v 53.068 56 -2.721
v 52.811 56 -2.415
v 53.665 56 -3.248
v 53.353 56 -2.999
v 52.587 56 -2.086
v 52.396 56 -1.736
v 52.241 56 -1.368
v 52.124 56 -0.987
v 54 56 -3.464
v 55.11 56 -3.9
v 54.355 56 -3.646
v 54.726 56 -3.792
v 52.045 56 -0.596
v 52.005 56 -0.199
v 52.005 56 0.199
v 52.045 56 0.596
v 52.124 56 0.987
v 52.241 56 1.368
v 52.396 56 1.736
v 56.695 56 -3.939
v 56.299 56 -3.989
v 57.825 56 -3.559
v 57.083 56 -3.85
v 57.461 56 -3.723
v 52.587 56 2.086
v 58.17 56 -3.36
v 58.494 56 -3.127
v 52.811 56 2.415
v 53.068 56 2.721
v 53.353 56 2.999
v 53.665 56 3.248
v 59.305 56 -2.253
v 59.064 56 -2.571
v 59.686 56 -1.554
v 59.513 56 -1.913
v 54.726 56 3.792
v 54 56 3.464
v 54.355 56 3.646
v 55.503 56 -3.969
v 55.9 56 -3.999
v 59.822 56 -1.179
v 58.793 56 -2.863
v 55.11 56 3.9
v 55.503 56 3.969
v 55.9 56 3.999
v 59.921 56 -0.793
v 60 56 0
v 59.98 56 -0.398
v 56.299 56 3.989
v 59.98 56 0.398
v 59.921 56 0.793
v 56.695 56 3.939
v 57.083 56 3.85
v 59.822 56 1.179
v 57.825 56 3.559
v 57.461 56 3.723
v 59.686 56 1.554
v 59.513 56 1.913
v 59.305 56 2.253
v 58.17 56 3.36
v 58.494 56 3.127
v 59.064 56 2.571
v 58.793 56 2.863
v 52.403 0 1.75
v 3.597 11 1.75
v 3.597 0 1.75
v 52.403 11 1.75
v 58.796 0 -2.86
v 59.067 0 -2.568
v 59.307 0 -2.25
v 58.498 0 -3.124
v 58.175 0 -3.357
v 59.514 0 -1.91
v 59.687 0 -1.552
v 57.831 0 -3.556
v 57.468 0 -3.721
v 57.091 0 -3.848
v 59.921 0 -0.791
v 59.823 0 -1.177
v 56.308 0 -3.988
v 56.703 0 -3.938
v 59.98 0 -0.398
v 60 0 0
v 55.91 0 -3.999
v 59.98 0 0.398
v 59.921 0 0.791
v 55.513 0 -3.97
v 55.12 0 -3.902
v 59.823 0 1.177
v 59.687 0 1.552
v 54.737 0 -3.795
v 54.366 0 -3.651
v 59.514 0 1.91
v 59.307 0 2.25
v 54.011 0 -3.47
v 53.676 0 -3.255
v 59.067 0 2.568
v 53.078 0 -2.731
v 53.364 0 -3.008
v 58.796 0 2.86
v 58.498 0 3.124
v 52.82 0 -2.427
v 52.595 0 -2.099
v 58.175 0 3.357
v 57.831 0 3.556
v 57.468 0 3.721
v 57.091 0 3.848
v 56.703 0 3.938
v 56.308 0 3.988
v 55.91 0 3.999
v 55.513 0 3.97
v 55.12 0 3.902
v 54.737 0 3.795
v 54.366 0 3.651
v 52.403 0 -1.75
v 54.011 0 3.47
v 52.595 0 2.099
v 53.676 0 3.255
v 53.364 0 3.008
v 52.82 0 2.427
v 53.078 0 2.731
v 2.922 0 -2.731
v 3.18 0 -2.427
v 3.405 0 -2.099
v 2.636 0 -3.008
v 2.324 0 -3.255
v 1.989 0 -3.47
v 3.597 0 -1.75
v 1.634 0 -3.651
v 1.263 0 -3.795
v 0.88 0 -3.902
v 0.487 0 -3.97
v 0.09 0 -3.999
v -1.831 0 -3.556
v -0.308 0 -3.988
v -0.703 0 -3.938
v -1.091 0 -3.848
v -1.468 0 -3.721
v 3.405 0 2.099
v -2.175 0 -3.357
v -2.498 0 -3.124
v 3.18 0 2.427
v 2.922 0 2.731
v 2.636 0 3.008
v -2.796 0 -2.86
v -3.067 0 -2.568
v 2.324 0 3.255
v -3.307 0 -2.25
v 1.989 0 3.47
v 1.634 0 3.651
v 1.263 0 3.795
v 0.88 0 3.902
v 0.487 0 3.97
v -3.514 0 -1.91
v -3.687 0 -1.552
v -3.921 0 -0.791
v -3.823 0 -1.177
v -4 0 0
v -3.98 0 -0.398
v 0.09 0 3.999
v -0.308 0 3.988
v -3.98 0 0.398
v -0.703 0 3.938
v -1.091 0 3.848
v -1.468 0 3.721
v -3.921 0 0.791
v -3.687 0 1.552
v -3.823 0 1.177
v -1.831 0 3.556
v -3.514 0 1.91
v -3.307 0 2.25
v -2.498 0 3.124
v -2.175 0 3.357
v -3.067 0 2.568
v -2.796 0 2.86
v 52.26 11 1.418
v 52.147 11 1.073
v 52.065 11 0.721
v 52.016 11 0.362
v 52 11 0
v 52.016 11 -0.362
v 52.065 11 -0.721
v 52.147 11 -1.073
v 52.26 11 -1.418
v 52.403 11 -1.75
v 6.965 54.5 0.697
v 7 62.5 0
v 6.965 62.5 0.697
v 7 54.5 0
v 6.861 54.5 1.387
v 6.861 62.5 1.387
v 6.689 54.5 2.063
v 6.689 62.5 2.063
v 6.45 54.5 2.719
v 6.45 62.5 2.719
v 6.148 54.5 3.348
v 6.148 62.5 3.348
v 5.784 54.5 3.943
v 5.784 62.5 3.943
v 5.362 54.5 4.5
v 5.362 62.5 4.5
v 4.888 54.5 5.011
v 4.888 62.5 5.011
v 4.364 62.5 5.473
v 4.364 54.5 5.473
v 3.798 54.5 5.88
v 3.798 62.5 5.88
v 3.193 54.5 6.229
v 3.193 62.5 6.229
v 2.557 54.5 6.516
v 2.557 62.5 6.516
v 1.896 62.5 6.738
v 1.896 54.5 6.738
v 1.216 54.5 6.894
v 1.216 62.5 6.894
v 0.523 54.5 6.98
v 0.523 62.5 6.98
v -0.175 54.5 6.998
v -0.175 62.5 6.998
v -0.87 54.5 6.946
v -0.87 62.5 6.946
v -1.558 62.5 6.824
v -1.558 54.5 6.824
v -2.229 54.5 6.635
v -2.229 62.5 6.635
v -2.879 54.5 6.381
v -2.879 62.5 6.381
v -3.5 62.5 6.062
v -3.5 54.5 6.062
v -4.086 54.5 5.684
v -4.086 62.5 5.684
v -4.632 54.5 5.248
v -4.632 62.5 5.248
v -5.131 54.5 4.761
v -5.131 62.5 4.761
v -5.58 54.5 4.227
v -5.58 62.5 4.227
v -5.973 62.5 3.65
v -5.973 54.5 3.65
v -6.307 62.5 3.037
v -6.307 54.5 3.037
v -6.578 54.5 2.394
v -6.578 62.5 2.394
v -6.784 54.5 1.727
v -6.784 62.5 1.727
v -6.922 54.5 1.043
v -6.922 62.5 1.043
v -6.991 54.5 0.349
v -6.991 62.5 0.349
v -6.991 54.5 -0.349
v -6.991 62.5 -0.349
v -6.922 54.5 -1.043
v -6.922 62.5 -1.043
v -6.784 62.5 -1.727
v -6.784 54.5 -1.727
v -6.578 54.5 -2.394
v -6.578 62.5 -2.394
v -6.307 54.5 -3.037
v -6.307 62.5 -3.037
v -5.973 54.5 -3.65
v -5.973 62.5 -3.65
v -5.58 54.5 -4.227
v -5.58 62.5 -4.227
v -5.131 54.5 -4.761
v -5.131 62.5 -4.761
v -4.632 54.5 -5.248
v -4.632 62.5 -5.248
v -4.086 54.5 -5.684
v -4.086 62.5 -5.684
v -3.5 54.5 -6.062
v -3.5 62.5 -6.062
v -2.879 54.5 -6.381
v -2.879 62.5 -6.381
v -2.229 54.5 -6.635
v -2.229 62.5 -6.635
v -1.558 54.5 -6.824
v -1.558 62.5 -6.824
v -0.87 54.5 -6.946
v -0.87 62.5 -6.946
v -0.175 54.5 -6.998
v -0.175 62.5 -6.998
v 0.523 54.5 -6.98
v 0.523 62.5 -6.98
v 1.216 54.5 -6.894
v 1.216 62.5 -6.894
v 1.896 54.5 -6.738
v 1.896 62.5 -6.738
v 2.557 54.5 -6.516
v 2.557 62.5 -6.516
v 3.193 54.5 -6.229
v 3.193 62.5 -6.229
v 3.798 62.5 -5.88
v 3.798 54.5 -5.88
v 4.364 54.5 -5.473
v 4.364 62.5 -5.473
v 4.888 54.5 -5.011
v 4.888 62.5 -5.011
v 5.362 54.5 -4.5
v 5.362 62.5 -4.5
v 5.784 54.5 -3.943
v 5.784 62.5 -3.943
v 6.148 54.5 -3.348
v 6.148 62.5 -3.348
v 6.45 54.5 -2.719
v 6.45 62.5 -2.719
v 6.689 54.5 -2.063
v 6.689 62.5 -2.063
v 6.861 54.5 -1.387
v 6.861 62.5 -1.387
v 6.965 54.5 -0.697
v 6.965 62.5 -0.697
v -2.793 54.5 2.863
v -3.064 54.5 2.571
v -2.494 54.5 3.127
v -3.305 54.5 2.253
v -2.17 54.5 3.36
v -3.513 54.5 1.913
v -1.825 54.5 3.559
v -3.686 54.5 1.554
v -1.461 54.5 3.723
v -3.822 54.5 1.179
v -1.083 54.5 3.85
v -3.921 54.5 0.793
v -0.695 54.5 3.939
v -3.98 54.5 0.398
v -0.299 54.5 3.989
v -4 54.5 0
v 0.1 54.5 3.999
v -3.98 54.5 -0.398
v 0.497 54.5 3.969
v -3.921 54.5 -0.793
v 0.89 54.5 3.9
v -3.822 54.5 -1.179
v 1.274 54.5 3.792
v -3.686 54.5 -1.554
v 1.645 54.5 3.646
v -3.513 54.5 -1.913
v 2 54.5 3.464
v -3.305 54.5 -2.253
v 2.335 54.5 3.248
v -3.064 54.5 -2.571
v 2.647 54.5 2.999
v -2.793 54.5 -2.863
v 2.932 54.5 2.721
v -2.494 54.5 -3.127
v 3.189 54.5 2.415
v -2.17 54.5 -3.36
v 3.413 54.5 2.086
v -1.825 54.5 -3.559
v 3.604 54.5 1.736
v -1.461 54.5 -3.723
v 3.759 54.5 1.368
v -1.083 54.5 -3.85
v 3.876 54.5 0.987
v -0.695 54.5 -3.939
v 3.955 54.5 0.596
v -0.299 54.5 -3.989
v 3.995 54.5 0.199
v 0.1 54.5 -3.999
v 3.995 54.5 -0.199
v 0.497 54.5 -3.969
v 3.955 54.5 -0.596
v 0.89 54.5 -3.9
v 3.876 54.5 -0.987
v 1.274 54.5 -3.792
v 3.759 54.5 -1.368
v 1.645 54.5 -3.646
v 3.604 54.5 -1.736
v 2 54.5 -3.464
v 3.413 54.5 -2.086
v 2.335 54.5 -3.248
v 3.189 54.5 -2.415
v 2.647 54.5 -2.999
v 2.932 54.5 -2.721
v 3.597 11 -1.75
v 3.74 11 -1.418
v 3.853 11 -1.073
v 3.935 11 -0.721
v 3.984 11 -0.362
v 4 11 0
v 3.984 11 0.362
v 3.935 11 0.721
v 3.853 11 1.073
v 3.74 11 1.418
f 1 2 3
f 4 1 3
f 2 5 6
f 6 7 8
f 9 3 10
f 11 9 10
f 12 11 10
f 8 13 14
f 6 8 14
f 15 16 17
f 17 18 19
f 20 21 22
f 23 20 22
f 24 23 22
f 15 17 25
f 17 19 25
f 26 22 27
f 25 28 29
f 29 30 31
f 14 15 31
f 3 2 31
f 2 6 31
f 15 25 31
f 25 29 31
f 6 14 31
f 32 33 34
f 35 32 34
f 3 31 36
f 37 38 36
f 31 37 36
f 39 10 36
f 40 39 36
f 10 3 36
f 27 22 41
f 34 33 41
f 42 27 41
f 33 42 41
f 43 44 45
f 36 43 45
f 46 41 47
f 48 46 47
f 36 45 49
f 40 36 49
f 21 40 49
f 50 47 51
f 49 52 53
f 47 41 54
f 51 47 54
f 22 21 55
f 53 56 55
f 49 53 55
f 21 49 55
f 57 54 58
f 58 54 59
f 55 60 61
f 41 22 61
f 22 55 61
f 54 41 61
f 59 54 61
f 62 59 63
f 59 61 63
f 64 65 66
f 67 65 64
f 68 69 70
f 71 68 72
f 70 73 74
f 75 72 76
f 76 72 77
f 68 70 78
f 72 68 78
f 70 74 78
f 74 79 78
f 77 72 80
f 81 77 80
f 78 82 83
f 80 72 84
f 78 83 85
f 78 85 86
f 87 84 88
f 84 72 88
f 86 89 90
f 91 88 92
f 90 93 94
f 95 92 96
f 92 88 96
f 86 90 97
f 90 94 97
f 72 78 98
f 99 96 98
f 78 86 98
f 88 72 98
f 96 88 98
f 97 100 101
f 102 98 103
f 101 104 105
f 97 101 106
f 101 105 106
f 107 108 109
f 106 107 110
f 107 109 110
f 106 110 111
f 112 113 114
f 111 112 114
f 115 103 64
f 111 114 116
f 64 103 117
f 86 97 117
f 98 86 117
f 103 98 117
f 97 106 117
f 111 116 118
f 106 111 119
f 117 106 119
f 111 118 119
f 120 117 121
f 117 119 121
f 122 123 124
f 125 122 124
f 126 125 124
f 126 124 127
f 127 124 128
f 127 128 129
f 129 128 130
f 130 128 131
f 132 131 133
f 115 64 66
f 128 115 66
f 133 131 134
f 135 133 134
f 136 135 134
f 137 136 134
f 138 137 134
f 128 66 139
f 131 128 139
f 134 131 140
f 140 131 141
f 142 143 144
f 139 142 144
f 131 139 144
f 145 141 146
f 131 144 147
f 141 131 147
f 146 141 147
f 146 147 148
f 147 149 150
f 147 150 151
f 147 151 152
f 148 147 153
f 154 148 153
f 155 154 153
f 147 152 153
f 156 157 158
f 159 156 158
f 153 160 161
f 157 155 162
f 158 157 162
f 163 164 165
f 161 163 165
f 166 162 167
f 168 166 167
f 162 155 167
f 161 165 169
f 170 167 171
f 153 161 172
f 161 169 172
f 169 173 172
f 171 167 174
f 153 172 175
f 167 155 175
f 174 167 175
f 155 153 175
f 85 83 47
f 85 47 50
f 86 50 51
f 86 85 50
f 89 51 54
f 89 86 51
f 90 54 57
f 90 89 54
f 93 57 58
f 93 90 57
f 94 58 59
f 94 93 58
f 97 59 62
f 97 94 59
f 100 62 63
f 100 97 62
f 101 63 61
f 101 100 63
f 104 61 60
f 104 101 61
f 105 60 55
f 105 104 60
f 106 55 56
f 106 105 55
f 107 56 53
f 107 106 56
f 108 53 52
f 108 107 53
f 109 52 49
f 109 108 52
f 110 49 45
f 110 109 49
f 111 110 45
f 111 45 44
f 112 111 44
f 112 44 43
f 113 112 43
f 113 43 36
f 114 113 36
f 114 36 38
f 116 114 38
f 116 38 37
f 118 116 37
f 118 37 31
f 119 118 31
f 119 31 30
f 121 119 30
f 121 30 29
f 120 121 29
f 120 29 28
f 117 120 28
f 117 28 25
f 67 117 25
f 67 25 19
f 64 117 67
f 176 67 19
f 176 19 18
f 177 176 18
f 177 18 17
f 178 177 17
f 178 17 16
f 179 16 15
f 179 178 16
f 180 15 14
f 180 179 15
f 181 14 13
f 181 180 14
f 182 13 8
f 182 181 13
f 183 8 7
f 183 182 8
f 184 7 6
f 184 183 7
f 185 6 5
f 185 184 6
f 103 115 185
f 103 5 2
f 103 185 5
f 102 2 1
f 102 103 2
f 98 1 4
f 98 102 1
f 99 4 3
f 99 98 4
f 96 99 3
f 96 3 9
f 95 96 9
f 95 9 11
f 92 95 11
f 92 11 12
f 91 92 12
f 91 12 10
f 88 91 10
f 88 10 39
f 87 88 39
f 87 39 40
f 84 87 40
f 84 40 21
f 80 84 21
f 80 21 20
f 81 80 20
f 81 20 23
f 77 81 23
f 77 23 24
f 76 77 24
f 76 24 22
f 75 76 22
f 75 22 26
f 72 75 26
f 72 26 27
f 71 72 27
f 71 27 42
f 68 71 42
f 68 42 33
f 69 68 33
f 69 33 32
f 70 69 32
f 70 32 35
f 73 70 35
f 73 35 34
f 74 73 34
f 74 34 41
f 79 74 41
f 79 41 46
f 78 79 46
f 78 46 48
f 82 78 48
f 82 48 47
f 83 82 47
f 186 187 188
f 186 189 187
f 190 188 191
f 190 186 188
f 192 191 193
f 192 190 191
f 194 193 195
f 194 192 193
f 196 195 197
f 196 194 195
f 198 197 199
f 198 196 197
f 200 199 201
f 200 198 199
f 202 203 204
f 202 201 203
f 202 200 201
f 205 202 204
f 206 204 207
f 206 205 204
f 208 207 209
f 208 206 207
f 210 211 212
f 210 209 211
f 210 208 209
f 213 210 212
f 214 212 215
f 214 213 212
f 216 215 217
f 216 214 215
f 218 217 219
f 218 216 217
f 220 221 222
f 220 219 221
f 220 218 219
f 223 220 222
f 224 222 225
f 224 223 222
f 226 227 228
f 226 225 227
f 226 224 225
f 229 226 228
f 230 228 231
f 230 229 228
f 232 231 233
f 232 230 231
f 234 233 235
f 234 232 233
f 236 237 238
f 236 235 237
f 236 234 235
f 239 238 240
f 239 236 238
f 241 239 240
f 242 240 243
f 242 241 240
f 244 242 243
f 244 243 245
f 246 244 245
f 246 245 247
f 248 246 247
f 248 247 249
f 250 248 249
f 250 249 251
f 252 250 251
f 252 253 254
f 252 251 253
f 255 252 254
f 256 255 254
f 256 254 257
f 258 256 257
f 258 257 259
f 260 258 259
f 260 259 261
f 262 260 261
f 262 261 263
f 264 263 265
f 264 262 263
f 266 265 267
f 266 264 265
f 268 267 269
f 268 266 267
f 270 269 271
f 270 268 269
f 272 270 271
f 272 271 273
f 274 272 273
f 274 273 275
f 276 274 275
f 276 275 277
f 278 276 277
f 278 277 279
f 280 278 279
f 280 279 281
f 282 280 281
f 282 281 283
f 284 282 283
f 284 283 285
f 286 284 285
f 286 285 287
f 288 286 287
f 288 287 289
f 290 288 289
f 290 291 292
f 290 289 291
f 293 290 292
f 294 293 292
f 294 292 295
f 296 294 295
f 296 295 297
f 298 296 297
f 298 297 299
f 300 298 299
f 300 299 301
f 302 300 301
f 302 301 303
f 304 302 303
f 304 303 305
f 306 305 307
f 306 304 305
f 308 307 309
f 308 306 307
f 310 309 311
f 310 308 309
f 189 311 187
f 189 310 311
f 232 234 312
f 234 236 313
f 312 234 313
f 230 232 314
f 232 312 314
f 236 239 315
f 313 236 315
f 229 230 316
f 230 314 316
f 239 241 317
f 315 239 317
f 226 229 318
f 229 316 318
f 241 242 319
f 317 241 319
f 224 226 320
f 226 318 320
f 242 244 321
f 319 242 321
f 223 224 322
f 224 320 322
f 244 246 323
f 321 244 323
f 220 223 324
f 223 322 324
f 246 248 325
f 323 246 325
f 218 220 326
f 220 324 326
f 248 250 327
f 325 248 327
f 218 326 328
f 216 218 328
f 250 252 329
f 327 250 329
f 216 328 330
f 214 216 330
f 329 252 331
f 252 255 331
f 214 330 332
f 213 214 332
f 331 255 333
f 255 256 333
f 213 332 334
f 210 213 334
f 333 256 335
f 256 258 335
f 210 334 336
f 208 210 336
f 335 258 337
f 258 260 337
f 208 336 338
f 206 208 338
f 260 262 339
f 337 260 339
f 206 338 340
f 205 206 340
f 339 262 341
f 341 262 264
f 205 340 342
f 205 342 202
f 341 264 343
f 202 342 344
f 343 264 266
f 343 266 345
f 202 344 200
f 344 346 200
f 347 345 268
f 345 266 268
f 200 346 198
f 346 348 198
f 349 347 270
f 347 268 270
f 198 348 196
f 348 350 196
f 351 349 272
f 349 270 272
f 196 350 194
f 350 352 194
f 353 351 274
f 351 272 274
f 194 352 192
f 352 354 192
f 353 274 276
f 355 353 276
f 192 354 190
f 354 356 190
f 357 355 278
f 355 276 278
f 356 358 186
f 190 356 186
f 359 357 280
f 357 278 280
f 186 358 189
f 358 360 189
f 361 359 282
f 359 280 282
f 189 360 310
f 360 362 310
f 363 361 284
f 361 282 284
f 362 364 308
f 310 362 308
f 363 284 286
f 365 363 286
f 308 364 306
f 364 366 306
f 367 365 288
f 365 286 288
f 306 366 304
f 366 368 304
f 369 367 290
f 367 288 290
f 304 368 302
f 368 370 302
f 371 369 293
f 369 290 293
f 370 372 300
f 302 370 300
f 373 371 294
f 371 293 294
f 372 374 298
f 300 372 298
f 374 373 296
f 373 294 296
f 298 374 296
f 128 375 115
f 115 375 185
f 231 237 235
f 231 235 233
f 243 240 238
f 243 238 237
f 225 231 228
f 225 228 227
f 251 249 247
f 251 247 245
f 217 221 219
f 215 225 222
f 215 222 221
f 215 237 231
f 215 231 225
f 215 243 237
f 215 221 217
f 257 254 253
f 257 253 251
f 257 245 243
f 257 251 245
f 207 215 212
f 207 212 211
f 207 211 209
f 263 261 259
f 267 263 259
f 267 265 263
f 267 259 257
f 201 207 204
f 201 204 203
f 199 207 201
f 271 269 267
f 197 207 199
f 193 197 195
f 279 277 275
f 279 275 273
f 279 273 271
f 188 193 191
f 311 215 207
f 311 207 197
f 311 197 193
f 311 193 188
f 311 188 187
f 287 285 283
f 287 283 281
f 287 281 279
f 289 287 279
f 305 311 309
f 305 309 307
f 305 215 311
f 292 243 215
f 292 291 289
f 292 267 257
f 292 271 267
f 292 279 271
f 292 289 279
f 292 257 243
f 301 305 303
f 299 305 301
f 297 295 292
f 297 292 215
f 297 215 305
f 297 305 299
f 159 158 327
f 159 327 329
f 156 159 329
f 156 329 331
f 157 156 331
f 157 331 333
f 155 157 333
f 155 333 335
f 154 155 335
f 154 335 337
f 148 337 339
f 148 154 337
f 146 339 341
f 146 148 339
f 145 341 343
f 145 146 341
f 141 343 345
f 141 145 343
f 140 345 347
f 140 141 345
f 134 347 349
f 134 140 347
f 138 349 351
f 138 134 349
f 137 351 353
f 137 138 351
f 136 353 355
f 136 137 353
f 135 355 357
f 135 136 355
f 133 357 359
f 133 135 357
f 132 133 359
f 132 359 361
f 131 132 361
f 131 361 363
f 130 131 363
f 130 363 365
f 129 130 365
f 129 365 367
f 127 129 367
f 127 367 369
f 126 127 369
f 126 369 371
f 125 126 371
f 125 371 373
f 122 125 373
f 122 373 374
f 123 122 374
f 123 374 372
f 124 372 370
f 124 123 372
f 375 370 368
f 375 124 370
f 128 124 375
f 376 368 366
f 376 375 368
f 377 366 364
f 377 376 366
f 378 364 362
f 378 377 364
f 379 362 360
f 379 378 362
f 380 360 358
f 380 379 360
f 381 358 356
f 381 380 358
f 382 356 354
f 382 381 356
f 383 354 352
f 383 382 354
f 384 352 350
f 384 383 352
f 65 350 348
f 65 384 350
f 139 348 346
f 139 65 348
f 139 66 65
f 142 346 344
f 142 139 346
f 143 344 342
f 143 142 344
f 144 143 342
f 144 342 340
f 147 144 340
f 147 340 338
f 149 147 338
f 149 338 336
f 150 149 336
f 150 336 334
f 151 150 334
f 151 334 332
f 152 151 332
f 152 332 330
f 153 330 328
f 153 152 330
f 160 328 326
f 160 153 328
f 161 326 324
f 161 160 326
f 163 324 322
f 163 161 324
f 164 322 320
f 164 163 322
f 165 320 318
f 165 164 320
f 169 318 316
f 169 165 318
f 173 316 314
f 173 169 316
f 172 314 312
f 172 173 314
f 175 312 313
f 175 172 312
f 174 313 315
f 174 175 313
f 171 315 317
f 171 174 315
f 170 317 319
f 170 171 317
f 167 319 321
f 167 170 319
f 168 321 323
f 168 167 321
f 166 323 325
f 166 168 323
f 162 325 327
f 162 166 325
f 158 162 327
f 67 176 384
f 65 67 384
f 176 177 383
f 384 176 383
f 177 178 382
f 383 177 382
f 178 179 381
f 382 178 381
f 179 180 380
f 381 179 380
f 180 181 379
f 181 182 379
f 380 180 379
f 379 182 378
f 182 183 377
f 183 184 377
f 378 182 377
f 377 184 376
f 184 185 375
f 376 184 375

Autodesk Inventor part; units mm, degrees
ref_plane "YZ Plane" through (0, 0, 0) normal (1, 0, 0) x (0, 1, 0)
ref_plane "XZ Plane" through (0, 0, 0) normal (0, 1, 0) x (-1, 0, 0)
ref_plane "XY Plane" through (0, 0, 0) normal (0, 0, 1) x (1, 0, 0)
sketch "Sketch1" plane through (0, 0, 0) normal (0, 1, 0) x (-1, 0, 0)
  circle A0 centre (0, 0) radius 4
  dimension "d0" = 8
extrude "Extrusion1" add sketch "Sketch1" along normal blind 54.5
sketch "Sketch2" plane through (0, 54.5, 0) normal (0, 1, 0) x (1, 0, 0)
  circle A0 centre (0, 0) radius 7
  dimension "d3" = 14
extrude "Extrusion2" add sketch "Sketch2" along normal blind 8
sketch "Sketch3" plane through (0, 0, 0) normal (0, 0, 1) x (1, 0, 0)
  line L0 (0, 0) -> (56, 0)
  line L1 (56, 0) -> (56, 11)
  line L2 (56, 11) -> (0, 11)
  line L3 (0, 11) -> (0, 0)
  dimension "d6" = 56
  dimension "d7" = 11
extrude "Extrusion3" add sketch "Sketch3" along normal mid plane 3.5
sketch "Sketch12" plane through (0, 0, 0) normal (0, -1, 0) x (1, 0, 0)
  line L0 (56, 1.75) -> (56, -1.75) projected
  circle A0 centre (56, 0) radius 4
  line L1 (-20.4, 0) -> (73.4, 0) projected
  point P0 (0, 0)
  dimension "d41" = 8
extrude "Extrusion10" add sketch "Sketch12" against normal blind 56
properties part number "Cube Cage" material "ABS Plastic"
